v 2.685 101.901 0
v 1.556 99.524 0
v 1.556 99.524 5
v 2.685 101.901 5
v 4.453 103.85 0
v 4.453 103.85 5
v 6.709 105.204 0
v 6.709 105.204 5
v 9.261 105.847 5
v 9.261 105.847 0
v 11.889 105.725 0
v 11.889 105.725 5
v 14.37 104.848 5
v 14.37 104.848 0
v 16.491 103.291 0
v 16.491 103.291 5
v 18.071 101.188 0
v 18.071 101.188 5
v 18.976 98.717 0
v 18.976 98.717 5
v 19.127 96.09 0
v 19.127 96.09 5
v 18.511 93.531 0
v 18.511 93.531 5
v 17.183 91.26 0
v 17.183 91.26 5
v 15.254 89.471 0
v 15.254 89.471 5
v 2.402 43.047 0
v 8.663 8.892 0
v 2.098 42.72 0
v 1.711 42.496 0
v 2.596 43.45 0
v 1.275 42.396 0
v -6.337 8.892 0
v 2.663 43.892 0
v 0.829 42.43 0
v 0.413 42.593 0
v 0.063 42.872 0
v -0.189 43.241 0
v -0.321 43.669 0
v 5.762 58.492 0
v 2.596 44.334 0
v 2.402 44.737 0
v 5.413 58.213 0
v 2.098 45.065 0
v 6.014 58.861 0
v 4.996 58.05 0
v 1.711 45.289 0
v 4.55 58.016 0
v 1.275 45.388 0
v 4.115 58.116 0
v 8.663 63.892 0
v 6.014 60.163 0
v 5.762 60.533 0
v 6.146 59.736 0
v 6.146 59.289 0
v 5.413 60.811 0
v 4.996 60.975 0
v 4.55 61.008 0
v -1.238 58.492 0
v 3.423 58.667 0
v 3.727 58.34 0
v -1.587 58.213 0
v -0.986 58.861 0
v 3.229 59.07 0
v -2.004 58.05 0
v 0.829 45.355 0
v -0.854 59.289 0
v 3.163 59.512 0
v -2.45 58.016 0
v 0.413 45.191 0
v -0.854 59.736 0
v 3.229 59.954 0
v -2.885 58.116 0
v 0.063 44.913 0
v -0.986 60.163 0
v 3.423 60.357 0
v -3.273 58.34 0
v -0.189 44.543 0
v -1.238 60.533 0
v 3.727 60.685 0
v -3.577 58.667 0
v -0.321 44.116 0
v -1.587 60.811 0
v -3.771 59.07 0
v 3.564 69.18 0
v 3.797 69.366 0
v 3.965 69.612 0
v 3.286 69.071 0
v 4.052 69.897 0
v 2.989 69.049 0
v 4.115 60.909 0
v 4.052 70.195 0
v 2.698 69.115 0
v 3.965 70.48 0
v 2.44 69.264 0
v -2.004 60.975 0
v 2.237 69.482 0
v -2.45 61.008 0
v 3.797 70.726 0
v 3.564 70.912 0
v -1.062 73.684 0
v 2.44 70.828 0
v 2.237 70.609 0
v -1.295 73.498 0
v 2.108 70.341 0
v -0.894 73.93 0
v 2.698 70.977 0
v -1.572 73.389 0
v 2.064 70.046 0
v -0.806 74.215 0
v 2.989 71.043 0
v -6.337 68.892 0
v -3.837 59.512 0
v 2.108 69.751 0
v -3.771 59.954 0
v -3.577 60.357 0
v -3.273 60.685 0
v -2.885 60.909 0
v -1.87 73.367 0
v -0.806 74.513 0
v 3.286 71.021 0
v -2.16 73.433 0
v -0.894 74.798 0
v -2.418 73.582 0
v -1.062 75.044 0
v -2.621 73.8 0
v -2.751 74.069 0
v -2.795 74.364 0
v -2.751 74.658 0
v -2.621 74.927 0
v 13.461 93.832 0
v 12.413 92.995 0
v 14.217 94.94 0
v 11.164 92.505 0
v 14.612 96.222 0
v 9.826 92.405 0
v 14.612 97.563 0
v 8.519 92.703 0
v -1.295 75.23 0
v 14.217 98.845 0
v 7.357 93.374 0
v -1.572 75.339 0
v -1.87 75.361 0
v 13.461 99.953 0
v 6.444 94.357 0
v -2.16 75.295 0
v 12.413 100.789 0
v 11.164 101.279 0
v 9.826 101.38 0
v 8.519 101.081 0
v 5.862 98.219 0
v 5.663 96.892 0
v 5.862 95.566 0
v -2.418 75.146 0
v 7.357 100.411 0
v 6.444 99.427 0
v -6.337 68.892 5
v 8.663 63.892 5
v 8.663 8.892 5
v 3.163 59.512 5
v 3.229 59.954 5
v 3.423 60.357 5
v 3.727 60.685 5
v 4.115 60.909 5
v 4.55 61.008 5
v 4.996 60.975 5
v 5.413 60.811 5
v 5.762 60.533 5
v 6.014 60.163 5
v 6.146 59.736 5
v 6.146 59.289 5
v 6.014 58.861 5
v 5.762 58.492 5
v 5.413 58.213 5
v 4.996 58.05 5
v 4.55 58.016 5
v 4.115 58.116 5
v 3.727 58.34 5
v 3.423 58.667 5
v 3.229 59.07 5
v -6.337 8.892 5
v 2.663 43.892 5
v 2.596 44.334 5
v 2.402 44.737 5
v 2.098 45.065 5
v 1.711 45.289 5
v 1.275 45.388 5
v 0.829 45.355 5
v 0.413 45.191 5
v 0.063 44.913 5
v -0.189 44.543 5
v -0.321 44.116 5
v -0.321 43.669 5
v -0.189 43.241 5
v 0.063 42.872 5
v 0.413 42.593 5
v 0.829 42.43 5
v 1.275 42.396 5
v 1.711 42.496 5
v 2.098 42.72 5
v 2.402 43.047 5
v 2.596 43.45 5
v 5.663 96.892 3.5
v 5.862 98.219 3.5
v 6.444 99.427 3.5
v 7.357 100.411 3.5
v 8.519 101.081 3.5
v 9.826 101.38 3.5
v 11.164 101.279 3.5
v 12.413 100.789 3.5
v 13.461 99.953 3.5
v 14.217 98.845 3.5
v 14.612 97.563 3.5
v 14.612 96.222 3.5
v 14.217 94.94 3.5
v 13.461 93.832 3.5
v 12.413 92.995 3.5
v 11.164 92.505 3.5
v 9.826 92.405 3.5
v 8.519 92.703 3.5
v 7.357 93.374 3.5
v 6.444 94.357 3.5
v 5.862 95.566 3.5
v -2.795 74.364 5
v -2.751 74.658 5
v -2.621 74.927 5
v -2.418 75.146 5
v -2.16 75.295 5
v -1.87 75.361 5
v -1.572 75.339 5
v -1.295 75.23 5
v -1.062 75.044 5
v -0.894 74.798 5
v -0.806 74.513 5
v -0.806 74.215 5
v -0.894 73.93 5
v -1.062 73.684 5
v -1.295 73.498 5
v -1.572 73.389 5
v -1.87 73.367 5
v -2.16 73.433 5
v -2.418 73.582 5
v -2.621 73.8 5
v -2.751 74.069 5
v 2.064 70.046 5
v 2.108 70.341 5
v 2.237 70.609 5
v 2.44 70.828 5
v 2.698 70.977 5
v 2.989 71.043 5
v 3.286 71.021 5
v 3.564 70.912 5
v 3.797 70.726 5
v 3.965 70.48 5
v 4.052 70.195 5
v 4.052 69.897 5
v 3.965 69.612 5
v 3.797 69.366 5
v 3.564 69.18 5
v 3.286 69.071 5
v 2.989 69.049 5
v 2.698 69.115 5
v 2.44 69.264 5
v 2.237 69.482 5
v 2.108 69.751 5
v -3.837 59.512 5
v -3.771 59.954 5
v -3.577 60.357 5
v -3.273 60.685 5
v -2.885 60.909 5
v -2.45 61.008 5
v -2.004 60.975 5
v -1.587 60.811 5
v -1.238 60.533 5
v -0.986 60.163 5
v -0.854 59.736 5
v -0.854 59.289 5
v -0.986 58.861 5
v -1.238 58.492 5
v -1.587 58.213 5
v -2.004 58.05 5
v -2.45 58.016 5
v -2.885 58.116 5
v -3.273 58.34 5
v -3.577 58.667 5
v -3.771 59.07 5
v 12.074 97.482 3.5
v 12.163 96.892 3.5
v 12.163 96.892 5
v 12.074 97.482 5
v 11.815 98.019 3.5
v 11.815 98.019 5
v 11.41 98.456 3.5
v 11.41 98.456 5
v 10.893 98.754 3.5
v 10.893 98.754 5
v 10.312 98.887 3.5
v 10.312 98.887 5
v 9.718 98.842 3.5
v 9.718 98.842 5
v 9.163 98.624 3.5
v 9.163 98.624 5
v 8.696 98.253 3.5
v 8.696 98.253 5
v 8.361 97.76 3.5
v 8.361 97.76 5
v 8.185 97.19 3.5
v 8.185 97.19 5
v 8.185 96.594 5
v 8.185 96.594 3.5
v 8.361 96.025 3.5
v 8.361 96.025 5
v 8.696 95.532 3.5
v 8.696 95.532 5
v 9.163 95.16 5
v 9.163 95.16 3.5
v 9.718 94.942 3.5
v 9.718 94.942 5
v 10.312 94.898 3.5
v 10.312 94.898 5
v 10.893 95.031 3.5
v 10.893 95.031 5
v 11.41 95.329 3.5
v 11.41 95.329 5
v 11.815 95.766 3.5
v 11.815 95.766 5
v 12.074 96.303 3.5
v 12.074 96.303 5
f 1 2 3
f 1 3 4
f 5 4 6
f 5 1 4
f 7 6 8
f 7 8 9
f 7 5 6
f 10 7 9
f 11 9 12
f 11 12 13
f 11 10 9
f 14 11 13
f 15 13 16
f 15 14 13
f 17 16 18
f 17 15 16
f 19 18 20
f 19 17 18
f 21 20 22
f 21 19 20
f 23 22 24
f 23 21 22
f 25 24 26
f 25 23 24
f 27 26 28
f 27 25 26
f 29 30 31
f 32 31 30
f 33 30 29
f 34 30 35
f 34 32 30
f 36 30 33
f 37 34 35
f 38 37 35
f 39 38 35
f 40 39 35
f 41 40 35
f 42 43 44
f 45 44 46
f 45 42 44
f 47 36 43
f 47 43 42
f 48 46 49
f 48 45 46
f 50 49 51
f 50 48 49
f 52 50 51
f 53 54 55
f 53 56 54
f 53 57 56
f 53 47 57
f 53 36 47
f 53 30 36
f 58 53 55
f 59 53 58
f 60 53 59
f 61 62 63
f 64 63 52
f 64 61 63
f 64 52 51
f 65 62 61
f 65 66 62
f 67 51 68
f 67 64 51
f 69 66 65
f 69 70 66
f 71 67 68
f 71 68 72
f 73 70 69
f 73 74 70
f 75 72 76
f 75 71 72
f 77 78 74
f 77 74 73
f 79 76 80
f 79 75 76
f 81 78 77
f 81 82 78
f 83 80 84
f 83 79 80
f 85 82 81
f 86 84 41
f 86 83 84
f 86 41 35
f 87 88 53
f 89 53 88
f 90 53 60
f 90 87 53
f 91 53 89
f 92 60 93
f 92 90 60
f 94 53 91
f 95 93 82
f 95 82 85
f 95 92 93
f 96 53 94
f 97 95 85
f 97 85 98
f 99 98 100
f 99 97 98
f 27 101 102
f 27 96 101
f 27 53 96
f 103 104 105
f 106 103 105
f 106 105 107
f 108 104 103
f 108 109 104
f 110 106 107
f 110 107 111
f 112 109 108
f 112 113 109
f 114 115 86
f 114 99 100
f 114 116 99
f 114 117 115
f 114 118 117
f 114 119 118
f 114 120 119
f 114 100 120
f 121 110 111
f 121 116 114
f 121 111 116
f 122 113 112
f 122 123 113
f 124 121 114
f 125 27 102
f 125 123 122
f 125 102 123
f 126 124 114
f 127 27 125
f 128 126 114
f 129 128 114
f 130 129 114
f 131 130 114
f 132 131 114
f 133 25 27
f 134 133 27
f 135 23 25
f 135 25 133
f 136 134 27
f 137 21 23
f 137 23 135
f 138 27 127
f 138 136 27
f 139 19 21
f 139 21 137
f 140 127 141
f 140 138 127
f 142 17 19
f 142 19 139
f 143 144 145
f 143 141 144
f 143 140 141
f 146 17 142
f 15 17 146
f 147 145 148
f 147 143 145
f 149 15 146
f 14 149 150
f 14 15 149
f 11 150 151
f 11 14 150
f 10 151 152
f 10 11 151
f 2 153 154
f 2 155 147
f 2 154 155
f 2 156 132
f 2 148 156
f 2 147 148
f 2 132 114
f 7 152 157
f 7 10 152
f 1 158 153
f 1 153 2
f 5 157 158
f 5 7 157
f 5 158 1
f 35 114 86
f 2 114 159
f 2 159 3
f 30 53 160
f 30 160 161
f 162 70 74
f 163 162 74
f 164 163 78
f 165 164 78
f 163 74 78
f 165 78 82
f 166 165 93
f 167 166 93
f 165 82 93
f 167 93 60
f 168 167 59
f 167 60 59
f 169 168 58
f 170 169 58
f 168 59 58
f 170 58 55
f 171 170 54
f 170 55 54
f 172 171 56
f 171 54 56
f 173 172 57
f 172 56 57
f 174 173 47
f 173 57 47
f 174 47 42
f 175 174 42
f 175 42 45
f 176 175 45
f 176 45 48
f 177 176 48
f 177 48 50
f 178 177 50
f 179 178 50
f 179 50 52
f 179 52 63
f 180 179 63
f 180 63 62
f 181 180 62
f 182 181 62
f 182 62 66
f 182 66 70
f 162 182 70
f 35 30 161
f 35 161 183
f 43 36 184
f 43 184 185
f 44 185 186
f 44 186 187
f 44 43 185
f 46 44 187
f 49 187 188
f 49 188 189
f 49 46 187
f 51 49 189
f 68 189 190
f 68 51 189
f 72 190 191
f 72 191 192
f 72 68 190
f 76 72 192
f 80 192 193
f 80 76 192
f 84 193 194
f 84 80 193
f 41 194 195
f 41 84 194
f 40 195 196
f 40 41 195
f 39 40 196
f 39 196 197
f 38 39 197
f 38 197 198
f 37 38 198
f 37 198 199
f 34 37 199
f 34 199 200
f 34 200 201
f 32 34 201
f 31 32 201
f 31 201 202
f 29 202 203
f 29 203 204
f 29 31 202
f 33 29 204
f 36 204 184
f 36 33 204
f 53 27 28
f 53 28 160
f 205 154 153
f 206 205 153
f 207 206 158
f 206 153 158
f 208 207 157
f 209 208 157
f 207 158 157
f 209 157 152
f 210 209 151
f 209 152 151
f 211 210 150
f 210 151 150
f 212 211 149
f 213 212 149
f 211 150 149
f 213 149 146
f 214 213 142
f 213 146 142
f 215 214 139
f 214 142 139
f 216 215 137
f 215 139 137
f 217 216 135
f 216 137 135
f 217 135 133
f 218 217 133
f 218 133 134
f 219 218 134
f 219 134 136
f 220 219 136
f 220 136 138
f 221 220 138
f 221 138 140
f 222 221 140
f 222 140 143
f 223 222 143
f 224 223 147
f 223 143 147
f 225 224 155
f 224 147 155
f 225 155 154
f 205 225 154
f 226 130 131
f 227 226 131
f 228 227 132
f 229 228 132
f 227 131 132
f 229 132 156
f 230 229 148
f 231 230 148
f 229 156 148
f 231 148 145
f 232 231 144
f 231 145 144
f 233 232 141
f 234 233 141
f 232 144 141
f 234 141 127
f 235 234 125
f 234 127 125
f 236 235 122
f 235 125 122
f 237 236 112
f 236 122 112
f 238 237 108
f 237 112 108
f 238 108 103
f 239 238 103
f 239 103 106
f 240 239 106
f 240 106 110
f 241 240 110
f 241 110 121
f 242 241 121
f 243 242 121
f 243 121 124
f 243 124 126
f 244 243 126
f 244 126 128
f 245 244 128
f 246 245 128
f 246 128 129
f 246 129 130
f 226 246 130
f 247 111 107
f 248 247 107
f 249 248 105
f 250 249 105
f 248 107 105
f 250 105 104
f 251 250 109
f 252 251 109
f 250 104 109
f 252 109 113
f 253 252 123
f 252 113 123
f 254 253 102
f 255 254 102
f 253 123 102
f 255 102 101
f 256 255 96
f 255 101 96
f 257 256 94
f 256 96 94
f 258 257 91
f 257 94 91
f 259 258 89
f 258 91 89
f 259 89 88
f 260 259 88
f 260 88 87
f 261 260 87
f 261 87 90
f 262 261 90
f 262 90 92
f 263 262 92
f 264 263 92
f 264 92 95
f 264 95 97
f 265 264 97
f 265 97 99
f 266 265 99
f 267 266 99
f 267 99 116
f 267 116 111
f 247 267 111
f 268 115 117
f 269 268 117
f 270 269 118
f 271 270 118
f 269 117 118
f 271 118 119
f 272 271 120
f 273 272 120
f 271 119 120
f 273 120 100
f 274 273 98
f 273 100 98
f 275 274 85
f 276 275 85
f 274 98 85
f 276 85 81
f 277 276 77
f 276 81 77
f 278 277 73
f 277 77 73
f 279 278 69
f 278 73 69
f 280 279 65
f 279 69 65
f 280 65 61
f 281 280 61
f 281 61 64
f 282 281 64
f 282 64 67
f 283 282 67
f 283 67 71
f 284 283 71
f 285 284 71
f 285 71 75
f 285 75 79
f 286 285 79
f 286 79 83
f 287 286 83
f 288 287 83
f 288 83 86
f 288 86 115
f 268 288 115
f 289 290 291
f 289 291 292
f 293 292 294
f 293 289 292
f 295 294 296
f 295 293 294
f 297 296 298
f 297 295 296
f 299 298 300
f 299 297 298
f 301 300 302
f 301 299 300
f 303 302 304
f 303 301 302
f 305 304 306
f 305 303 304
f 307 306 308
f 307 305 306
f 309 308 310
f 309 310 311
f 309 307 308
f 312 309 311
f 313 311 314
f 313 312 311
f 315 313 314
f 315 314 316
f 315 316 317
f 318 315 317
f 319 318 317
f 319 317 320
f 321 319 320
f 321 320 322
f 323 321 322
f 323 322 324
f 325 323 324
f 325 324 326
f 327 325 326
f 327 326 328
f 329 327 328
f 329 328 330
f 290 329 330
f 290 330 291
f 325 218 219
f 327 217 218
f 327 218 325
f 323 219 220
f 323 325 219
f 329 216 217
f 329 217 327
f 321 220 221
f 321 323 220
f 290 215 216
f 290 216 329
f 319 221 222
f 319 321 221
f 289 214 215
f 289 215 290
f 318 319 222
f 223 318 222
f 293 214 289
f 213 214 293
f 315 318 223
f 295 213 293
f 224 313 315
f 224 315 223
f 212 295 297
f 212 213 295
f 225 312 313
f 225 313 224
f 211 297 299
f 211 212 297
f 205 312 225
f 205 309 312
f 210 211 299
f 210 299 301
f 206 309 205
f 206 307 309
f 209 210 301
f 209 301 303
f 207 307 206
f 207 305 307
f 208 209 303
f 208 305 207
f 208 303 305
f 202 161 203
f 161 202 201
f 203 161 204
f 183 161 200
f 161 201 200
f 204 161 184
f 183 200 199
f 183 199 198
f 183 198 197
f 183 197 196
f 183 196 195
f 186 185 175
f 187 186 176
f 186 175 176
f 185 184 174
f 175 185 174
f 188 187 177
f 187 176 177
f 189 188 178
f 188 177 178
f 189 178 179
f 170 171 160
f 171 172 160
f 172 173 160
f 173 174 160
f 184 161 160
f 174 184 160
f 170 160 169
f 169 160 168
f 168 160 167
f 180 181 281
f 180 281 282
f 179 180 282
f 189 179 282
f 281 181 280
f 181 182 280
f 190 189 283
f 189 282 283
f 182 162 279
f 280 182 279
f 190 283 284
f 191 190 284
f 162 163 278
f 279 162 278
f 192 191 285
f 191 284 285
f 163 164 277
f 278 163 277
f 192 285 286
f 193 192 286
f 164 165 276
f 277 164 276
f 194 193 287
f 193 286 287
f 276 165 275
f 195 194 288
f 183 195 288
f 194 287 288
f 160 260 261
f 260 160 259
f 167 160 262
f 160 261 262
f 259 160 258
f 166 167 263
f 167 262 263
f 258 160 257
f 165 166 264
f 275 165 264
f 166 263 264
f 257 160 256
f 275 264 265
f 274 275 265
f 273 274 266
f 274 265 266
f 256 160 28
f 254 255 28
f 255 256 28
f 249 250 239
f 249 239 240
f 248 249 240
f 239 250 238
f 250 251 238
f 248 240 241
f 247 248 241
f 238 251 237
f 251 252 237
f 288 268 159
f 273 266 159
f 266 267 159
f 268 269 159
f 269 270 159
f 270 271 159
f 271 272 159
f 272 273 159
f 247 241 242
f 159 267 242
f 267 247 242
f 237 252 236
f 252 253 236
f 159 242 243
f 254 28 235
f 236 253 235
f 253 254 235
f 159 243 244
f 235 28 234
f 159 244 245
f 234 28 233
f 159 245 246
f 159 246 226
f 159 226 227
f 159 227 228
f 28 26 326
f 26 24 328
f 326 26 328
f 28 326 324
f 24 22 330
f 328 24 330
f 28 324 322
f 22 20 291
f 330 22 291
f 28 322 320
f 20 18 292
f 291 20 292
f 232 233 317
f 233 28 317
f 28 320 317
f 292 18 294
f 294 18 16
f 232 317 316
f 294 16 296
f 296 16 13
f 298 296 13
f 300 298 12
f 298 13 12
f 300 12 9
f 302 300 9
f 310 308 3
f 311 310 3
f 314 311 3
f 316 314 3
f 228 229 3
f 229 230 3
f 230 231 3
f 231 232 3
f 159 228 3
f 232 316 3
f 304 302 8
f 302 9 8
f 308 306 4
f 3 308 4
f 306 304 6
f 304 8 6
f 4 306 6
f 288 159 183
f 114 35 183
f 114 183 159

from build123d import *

# Parameters (mm, degrees)
SKETCH1_R           = 2
SKETCH1_R_2         = 1.5
BOSS_EXTRUDE1_DEPTH = 5
SKETCH3_R           = 4.5
CUT_EXTRUDE1_DEPTH  = 3.5
SKETCH7_R           = 1
CUT_EXTRUDE3_DEPTH  = 10
SKETCH10_R          = 1.499999992
CUT_EXTRUDE4_DEPTH  = 108.72827842


with BuildPart() as part:
    # Sketch1 → Boss-Extrude1 (new body)
    with BuildSketch(Plane.XY):
        with BuildLine():
            Line((8.662544735, 63.892298354), (8.662544735, 8.892298354))
            Line((8.662544735, 8.892298354), (-6.337455265, 8.892298354))
            Line((-6.337455265, 8.892298354), (-6.337455265, 68.892298354))
            Line((-6.337455265, 68.892298354), (1.556032109, 99.524396458))
            ThreePointArc((1.556032109, 99.524396458), (15.487791899, 104.147761306), (15.253774048, 89.470749723))
            Line((15.253774048, 89.470749723), (8.662544735, 63.892298354))
        make_face()
        with Locations((10.162544735, 96.892298354)):
            Circle(SKETCH1_R, mode=Mode.SUBTRACT)
        with Locations((1.162544735, 43.892298354)):
            Circle(SKETCH1_R_2, mode=Mode.SUBTRACT)
    extrude(amount=BOSS_EXTRUDE1_DEPTH)

    # Sketch3 → Cut-Extrude1 (cut)
    with BuildSketch(Plane(origin=(0, 0, 0), x_dir=(-1, 0, 0), z_dir=(0, 0, -1))):
        with Locations((-10.162544735, 96.892298354)):
            Circle(SKETCH3_R)
    extrude(amount=-CUT_EXTRUDE1_DEPTH, mode=Mode.SUBTRACT)

    # Sketch7 → Cut-Extrude3 (cut)
    with BuildSketch(Plane(origin=(0, 0, 0), x_dir=(-1, 0, 0), z_dir=(0, 0, -1))):
        with Locations((-3.063597883, 70.045794856)):
            Circle(SKETCH7_R)
        with Locations((1.794946815, 74.363727627)):
            Circle(SKETCH7_R)
    extrude(amount=-CUT_EXTRUDE3_DEPTH, mode=Mode.SUBTRACT)

    # Sketch10 → Cut-Extrude4 (cut, through all)
    with BuildSketch(Plane(origin=(0, 0, 0), x_dir=(-1, 0, 0), z_dir=(0, 0, -1))):
        with Locations((2.337455106, 59.512300154)):
            Circle(SKETCH10_R)
        with Locations((-4.662544922, 59.512300154)):
            Circle(SKETCH10_R)
    extrude(amount=-CUT_EXTRUDE4_DEPTH, mode=Mode.SUBTRACT)


solid = part.part
